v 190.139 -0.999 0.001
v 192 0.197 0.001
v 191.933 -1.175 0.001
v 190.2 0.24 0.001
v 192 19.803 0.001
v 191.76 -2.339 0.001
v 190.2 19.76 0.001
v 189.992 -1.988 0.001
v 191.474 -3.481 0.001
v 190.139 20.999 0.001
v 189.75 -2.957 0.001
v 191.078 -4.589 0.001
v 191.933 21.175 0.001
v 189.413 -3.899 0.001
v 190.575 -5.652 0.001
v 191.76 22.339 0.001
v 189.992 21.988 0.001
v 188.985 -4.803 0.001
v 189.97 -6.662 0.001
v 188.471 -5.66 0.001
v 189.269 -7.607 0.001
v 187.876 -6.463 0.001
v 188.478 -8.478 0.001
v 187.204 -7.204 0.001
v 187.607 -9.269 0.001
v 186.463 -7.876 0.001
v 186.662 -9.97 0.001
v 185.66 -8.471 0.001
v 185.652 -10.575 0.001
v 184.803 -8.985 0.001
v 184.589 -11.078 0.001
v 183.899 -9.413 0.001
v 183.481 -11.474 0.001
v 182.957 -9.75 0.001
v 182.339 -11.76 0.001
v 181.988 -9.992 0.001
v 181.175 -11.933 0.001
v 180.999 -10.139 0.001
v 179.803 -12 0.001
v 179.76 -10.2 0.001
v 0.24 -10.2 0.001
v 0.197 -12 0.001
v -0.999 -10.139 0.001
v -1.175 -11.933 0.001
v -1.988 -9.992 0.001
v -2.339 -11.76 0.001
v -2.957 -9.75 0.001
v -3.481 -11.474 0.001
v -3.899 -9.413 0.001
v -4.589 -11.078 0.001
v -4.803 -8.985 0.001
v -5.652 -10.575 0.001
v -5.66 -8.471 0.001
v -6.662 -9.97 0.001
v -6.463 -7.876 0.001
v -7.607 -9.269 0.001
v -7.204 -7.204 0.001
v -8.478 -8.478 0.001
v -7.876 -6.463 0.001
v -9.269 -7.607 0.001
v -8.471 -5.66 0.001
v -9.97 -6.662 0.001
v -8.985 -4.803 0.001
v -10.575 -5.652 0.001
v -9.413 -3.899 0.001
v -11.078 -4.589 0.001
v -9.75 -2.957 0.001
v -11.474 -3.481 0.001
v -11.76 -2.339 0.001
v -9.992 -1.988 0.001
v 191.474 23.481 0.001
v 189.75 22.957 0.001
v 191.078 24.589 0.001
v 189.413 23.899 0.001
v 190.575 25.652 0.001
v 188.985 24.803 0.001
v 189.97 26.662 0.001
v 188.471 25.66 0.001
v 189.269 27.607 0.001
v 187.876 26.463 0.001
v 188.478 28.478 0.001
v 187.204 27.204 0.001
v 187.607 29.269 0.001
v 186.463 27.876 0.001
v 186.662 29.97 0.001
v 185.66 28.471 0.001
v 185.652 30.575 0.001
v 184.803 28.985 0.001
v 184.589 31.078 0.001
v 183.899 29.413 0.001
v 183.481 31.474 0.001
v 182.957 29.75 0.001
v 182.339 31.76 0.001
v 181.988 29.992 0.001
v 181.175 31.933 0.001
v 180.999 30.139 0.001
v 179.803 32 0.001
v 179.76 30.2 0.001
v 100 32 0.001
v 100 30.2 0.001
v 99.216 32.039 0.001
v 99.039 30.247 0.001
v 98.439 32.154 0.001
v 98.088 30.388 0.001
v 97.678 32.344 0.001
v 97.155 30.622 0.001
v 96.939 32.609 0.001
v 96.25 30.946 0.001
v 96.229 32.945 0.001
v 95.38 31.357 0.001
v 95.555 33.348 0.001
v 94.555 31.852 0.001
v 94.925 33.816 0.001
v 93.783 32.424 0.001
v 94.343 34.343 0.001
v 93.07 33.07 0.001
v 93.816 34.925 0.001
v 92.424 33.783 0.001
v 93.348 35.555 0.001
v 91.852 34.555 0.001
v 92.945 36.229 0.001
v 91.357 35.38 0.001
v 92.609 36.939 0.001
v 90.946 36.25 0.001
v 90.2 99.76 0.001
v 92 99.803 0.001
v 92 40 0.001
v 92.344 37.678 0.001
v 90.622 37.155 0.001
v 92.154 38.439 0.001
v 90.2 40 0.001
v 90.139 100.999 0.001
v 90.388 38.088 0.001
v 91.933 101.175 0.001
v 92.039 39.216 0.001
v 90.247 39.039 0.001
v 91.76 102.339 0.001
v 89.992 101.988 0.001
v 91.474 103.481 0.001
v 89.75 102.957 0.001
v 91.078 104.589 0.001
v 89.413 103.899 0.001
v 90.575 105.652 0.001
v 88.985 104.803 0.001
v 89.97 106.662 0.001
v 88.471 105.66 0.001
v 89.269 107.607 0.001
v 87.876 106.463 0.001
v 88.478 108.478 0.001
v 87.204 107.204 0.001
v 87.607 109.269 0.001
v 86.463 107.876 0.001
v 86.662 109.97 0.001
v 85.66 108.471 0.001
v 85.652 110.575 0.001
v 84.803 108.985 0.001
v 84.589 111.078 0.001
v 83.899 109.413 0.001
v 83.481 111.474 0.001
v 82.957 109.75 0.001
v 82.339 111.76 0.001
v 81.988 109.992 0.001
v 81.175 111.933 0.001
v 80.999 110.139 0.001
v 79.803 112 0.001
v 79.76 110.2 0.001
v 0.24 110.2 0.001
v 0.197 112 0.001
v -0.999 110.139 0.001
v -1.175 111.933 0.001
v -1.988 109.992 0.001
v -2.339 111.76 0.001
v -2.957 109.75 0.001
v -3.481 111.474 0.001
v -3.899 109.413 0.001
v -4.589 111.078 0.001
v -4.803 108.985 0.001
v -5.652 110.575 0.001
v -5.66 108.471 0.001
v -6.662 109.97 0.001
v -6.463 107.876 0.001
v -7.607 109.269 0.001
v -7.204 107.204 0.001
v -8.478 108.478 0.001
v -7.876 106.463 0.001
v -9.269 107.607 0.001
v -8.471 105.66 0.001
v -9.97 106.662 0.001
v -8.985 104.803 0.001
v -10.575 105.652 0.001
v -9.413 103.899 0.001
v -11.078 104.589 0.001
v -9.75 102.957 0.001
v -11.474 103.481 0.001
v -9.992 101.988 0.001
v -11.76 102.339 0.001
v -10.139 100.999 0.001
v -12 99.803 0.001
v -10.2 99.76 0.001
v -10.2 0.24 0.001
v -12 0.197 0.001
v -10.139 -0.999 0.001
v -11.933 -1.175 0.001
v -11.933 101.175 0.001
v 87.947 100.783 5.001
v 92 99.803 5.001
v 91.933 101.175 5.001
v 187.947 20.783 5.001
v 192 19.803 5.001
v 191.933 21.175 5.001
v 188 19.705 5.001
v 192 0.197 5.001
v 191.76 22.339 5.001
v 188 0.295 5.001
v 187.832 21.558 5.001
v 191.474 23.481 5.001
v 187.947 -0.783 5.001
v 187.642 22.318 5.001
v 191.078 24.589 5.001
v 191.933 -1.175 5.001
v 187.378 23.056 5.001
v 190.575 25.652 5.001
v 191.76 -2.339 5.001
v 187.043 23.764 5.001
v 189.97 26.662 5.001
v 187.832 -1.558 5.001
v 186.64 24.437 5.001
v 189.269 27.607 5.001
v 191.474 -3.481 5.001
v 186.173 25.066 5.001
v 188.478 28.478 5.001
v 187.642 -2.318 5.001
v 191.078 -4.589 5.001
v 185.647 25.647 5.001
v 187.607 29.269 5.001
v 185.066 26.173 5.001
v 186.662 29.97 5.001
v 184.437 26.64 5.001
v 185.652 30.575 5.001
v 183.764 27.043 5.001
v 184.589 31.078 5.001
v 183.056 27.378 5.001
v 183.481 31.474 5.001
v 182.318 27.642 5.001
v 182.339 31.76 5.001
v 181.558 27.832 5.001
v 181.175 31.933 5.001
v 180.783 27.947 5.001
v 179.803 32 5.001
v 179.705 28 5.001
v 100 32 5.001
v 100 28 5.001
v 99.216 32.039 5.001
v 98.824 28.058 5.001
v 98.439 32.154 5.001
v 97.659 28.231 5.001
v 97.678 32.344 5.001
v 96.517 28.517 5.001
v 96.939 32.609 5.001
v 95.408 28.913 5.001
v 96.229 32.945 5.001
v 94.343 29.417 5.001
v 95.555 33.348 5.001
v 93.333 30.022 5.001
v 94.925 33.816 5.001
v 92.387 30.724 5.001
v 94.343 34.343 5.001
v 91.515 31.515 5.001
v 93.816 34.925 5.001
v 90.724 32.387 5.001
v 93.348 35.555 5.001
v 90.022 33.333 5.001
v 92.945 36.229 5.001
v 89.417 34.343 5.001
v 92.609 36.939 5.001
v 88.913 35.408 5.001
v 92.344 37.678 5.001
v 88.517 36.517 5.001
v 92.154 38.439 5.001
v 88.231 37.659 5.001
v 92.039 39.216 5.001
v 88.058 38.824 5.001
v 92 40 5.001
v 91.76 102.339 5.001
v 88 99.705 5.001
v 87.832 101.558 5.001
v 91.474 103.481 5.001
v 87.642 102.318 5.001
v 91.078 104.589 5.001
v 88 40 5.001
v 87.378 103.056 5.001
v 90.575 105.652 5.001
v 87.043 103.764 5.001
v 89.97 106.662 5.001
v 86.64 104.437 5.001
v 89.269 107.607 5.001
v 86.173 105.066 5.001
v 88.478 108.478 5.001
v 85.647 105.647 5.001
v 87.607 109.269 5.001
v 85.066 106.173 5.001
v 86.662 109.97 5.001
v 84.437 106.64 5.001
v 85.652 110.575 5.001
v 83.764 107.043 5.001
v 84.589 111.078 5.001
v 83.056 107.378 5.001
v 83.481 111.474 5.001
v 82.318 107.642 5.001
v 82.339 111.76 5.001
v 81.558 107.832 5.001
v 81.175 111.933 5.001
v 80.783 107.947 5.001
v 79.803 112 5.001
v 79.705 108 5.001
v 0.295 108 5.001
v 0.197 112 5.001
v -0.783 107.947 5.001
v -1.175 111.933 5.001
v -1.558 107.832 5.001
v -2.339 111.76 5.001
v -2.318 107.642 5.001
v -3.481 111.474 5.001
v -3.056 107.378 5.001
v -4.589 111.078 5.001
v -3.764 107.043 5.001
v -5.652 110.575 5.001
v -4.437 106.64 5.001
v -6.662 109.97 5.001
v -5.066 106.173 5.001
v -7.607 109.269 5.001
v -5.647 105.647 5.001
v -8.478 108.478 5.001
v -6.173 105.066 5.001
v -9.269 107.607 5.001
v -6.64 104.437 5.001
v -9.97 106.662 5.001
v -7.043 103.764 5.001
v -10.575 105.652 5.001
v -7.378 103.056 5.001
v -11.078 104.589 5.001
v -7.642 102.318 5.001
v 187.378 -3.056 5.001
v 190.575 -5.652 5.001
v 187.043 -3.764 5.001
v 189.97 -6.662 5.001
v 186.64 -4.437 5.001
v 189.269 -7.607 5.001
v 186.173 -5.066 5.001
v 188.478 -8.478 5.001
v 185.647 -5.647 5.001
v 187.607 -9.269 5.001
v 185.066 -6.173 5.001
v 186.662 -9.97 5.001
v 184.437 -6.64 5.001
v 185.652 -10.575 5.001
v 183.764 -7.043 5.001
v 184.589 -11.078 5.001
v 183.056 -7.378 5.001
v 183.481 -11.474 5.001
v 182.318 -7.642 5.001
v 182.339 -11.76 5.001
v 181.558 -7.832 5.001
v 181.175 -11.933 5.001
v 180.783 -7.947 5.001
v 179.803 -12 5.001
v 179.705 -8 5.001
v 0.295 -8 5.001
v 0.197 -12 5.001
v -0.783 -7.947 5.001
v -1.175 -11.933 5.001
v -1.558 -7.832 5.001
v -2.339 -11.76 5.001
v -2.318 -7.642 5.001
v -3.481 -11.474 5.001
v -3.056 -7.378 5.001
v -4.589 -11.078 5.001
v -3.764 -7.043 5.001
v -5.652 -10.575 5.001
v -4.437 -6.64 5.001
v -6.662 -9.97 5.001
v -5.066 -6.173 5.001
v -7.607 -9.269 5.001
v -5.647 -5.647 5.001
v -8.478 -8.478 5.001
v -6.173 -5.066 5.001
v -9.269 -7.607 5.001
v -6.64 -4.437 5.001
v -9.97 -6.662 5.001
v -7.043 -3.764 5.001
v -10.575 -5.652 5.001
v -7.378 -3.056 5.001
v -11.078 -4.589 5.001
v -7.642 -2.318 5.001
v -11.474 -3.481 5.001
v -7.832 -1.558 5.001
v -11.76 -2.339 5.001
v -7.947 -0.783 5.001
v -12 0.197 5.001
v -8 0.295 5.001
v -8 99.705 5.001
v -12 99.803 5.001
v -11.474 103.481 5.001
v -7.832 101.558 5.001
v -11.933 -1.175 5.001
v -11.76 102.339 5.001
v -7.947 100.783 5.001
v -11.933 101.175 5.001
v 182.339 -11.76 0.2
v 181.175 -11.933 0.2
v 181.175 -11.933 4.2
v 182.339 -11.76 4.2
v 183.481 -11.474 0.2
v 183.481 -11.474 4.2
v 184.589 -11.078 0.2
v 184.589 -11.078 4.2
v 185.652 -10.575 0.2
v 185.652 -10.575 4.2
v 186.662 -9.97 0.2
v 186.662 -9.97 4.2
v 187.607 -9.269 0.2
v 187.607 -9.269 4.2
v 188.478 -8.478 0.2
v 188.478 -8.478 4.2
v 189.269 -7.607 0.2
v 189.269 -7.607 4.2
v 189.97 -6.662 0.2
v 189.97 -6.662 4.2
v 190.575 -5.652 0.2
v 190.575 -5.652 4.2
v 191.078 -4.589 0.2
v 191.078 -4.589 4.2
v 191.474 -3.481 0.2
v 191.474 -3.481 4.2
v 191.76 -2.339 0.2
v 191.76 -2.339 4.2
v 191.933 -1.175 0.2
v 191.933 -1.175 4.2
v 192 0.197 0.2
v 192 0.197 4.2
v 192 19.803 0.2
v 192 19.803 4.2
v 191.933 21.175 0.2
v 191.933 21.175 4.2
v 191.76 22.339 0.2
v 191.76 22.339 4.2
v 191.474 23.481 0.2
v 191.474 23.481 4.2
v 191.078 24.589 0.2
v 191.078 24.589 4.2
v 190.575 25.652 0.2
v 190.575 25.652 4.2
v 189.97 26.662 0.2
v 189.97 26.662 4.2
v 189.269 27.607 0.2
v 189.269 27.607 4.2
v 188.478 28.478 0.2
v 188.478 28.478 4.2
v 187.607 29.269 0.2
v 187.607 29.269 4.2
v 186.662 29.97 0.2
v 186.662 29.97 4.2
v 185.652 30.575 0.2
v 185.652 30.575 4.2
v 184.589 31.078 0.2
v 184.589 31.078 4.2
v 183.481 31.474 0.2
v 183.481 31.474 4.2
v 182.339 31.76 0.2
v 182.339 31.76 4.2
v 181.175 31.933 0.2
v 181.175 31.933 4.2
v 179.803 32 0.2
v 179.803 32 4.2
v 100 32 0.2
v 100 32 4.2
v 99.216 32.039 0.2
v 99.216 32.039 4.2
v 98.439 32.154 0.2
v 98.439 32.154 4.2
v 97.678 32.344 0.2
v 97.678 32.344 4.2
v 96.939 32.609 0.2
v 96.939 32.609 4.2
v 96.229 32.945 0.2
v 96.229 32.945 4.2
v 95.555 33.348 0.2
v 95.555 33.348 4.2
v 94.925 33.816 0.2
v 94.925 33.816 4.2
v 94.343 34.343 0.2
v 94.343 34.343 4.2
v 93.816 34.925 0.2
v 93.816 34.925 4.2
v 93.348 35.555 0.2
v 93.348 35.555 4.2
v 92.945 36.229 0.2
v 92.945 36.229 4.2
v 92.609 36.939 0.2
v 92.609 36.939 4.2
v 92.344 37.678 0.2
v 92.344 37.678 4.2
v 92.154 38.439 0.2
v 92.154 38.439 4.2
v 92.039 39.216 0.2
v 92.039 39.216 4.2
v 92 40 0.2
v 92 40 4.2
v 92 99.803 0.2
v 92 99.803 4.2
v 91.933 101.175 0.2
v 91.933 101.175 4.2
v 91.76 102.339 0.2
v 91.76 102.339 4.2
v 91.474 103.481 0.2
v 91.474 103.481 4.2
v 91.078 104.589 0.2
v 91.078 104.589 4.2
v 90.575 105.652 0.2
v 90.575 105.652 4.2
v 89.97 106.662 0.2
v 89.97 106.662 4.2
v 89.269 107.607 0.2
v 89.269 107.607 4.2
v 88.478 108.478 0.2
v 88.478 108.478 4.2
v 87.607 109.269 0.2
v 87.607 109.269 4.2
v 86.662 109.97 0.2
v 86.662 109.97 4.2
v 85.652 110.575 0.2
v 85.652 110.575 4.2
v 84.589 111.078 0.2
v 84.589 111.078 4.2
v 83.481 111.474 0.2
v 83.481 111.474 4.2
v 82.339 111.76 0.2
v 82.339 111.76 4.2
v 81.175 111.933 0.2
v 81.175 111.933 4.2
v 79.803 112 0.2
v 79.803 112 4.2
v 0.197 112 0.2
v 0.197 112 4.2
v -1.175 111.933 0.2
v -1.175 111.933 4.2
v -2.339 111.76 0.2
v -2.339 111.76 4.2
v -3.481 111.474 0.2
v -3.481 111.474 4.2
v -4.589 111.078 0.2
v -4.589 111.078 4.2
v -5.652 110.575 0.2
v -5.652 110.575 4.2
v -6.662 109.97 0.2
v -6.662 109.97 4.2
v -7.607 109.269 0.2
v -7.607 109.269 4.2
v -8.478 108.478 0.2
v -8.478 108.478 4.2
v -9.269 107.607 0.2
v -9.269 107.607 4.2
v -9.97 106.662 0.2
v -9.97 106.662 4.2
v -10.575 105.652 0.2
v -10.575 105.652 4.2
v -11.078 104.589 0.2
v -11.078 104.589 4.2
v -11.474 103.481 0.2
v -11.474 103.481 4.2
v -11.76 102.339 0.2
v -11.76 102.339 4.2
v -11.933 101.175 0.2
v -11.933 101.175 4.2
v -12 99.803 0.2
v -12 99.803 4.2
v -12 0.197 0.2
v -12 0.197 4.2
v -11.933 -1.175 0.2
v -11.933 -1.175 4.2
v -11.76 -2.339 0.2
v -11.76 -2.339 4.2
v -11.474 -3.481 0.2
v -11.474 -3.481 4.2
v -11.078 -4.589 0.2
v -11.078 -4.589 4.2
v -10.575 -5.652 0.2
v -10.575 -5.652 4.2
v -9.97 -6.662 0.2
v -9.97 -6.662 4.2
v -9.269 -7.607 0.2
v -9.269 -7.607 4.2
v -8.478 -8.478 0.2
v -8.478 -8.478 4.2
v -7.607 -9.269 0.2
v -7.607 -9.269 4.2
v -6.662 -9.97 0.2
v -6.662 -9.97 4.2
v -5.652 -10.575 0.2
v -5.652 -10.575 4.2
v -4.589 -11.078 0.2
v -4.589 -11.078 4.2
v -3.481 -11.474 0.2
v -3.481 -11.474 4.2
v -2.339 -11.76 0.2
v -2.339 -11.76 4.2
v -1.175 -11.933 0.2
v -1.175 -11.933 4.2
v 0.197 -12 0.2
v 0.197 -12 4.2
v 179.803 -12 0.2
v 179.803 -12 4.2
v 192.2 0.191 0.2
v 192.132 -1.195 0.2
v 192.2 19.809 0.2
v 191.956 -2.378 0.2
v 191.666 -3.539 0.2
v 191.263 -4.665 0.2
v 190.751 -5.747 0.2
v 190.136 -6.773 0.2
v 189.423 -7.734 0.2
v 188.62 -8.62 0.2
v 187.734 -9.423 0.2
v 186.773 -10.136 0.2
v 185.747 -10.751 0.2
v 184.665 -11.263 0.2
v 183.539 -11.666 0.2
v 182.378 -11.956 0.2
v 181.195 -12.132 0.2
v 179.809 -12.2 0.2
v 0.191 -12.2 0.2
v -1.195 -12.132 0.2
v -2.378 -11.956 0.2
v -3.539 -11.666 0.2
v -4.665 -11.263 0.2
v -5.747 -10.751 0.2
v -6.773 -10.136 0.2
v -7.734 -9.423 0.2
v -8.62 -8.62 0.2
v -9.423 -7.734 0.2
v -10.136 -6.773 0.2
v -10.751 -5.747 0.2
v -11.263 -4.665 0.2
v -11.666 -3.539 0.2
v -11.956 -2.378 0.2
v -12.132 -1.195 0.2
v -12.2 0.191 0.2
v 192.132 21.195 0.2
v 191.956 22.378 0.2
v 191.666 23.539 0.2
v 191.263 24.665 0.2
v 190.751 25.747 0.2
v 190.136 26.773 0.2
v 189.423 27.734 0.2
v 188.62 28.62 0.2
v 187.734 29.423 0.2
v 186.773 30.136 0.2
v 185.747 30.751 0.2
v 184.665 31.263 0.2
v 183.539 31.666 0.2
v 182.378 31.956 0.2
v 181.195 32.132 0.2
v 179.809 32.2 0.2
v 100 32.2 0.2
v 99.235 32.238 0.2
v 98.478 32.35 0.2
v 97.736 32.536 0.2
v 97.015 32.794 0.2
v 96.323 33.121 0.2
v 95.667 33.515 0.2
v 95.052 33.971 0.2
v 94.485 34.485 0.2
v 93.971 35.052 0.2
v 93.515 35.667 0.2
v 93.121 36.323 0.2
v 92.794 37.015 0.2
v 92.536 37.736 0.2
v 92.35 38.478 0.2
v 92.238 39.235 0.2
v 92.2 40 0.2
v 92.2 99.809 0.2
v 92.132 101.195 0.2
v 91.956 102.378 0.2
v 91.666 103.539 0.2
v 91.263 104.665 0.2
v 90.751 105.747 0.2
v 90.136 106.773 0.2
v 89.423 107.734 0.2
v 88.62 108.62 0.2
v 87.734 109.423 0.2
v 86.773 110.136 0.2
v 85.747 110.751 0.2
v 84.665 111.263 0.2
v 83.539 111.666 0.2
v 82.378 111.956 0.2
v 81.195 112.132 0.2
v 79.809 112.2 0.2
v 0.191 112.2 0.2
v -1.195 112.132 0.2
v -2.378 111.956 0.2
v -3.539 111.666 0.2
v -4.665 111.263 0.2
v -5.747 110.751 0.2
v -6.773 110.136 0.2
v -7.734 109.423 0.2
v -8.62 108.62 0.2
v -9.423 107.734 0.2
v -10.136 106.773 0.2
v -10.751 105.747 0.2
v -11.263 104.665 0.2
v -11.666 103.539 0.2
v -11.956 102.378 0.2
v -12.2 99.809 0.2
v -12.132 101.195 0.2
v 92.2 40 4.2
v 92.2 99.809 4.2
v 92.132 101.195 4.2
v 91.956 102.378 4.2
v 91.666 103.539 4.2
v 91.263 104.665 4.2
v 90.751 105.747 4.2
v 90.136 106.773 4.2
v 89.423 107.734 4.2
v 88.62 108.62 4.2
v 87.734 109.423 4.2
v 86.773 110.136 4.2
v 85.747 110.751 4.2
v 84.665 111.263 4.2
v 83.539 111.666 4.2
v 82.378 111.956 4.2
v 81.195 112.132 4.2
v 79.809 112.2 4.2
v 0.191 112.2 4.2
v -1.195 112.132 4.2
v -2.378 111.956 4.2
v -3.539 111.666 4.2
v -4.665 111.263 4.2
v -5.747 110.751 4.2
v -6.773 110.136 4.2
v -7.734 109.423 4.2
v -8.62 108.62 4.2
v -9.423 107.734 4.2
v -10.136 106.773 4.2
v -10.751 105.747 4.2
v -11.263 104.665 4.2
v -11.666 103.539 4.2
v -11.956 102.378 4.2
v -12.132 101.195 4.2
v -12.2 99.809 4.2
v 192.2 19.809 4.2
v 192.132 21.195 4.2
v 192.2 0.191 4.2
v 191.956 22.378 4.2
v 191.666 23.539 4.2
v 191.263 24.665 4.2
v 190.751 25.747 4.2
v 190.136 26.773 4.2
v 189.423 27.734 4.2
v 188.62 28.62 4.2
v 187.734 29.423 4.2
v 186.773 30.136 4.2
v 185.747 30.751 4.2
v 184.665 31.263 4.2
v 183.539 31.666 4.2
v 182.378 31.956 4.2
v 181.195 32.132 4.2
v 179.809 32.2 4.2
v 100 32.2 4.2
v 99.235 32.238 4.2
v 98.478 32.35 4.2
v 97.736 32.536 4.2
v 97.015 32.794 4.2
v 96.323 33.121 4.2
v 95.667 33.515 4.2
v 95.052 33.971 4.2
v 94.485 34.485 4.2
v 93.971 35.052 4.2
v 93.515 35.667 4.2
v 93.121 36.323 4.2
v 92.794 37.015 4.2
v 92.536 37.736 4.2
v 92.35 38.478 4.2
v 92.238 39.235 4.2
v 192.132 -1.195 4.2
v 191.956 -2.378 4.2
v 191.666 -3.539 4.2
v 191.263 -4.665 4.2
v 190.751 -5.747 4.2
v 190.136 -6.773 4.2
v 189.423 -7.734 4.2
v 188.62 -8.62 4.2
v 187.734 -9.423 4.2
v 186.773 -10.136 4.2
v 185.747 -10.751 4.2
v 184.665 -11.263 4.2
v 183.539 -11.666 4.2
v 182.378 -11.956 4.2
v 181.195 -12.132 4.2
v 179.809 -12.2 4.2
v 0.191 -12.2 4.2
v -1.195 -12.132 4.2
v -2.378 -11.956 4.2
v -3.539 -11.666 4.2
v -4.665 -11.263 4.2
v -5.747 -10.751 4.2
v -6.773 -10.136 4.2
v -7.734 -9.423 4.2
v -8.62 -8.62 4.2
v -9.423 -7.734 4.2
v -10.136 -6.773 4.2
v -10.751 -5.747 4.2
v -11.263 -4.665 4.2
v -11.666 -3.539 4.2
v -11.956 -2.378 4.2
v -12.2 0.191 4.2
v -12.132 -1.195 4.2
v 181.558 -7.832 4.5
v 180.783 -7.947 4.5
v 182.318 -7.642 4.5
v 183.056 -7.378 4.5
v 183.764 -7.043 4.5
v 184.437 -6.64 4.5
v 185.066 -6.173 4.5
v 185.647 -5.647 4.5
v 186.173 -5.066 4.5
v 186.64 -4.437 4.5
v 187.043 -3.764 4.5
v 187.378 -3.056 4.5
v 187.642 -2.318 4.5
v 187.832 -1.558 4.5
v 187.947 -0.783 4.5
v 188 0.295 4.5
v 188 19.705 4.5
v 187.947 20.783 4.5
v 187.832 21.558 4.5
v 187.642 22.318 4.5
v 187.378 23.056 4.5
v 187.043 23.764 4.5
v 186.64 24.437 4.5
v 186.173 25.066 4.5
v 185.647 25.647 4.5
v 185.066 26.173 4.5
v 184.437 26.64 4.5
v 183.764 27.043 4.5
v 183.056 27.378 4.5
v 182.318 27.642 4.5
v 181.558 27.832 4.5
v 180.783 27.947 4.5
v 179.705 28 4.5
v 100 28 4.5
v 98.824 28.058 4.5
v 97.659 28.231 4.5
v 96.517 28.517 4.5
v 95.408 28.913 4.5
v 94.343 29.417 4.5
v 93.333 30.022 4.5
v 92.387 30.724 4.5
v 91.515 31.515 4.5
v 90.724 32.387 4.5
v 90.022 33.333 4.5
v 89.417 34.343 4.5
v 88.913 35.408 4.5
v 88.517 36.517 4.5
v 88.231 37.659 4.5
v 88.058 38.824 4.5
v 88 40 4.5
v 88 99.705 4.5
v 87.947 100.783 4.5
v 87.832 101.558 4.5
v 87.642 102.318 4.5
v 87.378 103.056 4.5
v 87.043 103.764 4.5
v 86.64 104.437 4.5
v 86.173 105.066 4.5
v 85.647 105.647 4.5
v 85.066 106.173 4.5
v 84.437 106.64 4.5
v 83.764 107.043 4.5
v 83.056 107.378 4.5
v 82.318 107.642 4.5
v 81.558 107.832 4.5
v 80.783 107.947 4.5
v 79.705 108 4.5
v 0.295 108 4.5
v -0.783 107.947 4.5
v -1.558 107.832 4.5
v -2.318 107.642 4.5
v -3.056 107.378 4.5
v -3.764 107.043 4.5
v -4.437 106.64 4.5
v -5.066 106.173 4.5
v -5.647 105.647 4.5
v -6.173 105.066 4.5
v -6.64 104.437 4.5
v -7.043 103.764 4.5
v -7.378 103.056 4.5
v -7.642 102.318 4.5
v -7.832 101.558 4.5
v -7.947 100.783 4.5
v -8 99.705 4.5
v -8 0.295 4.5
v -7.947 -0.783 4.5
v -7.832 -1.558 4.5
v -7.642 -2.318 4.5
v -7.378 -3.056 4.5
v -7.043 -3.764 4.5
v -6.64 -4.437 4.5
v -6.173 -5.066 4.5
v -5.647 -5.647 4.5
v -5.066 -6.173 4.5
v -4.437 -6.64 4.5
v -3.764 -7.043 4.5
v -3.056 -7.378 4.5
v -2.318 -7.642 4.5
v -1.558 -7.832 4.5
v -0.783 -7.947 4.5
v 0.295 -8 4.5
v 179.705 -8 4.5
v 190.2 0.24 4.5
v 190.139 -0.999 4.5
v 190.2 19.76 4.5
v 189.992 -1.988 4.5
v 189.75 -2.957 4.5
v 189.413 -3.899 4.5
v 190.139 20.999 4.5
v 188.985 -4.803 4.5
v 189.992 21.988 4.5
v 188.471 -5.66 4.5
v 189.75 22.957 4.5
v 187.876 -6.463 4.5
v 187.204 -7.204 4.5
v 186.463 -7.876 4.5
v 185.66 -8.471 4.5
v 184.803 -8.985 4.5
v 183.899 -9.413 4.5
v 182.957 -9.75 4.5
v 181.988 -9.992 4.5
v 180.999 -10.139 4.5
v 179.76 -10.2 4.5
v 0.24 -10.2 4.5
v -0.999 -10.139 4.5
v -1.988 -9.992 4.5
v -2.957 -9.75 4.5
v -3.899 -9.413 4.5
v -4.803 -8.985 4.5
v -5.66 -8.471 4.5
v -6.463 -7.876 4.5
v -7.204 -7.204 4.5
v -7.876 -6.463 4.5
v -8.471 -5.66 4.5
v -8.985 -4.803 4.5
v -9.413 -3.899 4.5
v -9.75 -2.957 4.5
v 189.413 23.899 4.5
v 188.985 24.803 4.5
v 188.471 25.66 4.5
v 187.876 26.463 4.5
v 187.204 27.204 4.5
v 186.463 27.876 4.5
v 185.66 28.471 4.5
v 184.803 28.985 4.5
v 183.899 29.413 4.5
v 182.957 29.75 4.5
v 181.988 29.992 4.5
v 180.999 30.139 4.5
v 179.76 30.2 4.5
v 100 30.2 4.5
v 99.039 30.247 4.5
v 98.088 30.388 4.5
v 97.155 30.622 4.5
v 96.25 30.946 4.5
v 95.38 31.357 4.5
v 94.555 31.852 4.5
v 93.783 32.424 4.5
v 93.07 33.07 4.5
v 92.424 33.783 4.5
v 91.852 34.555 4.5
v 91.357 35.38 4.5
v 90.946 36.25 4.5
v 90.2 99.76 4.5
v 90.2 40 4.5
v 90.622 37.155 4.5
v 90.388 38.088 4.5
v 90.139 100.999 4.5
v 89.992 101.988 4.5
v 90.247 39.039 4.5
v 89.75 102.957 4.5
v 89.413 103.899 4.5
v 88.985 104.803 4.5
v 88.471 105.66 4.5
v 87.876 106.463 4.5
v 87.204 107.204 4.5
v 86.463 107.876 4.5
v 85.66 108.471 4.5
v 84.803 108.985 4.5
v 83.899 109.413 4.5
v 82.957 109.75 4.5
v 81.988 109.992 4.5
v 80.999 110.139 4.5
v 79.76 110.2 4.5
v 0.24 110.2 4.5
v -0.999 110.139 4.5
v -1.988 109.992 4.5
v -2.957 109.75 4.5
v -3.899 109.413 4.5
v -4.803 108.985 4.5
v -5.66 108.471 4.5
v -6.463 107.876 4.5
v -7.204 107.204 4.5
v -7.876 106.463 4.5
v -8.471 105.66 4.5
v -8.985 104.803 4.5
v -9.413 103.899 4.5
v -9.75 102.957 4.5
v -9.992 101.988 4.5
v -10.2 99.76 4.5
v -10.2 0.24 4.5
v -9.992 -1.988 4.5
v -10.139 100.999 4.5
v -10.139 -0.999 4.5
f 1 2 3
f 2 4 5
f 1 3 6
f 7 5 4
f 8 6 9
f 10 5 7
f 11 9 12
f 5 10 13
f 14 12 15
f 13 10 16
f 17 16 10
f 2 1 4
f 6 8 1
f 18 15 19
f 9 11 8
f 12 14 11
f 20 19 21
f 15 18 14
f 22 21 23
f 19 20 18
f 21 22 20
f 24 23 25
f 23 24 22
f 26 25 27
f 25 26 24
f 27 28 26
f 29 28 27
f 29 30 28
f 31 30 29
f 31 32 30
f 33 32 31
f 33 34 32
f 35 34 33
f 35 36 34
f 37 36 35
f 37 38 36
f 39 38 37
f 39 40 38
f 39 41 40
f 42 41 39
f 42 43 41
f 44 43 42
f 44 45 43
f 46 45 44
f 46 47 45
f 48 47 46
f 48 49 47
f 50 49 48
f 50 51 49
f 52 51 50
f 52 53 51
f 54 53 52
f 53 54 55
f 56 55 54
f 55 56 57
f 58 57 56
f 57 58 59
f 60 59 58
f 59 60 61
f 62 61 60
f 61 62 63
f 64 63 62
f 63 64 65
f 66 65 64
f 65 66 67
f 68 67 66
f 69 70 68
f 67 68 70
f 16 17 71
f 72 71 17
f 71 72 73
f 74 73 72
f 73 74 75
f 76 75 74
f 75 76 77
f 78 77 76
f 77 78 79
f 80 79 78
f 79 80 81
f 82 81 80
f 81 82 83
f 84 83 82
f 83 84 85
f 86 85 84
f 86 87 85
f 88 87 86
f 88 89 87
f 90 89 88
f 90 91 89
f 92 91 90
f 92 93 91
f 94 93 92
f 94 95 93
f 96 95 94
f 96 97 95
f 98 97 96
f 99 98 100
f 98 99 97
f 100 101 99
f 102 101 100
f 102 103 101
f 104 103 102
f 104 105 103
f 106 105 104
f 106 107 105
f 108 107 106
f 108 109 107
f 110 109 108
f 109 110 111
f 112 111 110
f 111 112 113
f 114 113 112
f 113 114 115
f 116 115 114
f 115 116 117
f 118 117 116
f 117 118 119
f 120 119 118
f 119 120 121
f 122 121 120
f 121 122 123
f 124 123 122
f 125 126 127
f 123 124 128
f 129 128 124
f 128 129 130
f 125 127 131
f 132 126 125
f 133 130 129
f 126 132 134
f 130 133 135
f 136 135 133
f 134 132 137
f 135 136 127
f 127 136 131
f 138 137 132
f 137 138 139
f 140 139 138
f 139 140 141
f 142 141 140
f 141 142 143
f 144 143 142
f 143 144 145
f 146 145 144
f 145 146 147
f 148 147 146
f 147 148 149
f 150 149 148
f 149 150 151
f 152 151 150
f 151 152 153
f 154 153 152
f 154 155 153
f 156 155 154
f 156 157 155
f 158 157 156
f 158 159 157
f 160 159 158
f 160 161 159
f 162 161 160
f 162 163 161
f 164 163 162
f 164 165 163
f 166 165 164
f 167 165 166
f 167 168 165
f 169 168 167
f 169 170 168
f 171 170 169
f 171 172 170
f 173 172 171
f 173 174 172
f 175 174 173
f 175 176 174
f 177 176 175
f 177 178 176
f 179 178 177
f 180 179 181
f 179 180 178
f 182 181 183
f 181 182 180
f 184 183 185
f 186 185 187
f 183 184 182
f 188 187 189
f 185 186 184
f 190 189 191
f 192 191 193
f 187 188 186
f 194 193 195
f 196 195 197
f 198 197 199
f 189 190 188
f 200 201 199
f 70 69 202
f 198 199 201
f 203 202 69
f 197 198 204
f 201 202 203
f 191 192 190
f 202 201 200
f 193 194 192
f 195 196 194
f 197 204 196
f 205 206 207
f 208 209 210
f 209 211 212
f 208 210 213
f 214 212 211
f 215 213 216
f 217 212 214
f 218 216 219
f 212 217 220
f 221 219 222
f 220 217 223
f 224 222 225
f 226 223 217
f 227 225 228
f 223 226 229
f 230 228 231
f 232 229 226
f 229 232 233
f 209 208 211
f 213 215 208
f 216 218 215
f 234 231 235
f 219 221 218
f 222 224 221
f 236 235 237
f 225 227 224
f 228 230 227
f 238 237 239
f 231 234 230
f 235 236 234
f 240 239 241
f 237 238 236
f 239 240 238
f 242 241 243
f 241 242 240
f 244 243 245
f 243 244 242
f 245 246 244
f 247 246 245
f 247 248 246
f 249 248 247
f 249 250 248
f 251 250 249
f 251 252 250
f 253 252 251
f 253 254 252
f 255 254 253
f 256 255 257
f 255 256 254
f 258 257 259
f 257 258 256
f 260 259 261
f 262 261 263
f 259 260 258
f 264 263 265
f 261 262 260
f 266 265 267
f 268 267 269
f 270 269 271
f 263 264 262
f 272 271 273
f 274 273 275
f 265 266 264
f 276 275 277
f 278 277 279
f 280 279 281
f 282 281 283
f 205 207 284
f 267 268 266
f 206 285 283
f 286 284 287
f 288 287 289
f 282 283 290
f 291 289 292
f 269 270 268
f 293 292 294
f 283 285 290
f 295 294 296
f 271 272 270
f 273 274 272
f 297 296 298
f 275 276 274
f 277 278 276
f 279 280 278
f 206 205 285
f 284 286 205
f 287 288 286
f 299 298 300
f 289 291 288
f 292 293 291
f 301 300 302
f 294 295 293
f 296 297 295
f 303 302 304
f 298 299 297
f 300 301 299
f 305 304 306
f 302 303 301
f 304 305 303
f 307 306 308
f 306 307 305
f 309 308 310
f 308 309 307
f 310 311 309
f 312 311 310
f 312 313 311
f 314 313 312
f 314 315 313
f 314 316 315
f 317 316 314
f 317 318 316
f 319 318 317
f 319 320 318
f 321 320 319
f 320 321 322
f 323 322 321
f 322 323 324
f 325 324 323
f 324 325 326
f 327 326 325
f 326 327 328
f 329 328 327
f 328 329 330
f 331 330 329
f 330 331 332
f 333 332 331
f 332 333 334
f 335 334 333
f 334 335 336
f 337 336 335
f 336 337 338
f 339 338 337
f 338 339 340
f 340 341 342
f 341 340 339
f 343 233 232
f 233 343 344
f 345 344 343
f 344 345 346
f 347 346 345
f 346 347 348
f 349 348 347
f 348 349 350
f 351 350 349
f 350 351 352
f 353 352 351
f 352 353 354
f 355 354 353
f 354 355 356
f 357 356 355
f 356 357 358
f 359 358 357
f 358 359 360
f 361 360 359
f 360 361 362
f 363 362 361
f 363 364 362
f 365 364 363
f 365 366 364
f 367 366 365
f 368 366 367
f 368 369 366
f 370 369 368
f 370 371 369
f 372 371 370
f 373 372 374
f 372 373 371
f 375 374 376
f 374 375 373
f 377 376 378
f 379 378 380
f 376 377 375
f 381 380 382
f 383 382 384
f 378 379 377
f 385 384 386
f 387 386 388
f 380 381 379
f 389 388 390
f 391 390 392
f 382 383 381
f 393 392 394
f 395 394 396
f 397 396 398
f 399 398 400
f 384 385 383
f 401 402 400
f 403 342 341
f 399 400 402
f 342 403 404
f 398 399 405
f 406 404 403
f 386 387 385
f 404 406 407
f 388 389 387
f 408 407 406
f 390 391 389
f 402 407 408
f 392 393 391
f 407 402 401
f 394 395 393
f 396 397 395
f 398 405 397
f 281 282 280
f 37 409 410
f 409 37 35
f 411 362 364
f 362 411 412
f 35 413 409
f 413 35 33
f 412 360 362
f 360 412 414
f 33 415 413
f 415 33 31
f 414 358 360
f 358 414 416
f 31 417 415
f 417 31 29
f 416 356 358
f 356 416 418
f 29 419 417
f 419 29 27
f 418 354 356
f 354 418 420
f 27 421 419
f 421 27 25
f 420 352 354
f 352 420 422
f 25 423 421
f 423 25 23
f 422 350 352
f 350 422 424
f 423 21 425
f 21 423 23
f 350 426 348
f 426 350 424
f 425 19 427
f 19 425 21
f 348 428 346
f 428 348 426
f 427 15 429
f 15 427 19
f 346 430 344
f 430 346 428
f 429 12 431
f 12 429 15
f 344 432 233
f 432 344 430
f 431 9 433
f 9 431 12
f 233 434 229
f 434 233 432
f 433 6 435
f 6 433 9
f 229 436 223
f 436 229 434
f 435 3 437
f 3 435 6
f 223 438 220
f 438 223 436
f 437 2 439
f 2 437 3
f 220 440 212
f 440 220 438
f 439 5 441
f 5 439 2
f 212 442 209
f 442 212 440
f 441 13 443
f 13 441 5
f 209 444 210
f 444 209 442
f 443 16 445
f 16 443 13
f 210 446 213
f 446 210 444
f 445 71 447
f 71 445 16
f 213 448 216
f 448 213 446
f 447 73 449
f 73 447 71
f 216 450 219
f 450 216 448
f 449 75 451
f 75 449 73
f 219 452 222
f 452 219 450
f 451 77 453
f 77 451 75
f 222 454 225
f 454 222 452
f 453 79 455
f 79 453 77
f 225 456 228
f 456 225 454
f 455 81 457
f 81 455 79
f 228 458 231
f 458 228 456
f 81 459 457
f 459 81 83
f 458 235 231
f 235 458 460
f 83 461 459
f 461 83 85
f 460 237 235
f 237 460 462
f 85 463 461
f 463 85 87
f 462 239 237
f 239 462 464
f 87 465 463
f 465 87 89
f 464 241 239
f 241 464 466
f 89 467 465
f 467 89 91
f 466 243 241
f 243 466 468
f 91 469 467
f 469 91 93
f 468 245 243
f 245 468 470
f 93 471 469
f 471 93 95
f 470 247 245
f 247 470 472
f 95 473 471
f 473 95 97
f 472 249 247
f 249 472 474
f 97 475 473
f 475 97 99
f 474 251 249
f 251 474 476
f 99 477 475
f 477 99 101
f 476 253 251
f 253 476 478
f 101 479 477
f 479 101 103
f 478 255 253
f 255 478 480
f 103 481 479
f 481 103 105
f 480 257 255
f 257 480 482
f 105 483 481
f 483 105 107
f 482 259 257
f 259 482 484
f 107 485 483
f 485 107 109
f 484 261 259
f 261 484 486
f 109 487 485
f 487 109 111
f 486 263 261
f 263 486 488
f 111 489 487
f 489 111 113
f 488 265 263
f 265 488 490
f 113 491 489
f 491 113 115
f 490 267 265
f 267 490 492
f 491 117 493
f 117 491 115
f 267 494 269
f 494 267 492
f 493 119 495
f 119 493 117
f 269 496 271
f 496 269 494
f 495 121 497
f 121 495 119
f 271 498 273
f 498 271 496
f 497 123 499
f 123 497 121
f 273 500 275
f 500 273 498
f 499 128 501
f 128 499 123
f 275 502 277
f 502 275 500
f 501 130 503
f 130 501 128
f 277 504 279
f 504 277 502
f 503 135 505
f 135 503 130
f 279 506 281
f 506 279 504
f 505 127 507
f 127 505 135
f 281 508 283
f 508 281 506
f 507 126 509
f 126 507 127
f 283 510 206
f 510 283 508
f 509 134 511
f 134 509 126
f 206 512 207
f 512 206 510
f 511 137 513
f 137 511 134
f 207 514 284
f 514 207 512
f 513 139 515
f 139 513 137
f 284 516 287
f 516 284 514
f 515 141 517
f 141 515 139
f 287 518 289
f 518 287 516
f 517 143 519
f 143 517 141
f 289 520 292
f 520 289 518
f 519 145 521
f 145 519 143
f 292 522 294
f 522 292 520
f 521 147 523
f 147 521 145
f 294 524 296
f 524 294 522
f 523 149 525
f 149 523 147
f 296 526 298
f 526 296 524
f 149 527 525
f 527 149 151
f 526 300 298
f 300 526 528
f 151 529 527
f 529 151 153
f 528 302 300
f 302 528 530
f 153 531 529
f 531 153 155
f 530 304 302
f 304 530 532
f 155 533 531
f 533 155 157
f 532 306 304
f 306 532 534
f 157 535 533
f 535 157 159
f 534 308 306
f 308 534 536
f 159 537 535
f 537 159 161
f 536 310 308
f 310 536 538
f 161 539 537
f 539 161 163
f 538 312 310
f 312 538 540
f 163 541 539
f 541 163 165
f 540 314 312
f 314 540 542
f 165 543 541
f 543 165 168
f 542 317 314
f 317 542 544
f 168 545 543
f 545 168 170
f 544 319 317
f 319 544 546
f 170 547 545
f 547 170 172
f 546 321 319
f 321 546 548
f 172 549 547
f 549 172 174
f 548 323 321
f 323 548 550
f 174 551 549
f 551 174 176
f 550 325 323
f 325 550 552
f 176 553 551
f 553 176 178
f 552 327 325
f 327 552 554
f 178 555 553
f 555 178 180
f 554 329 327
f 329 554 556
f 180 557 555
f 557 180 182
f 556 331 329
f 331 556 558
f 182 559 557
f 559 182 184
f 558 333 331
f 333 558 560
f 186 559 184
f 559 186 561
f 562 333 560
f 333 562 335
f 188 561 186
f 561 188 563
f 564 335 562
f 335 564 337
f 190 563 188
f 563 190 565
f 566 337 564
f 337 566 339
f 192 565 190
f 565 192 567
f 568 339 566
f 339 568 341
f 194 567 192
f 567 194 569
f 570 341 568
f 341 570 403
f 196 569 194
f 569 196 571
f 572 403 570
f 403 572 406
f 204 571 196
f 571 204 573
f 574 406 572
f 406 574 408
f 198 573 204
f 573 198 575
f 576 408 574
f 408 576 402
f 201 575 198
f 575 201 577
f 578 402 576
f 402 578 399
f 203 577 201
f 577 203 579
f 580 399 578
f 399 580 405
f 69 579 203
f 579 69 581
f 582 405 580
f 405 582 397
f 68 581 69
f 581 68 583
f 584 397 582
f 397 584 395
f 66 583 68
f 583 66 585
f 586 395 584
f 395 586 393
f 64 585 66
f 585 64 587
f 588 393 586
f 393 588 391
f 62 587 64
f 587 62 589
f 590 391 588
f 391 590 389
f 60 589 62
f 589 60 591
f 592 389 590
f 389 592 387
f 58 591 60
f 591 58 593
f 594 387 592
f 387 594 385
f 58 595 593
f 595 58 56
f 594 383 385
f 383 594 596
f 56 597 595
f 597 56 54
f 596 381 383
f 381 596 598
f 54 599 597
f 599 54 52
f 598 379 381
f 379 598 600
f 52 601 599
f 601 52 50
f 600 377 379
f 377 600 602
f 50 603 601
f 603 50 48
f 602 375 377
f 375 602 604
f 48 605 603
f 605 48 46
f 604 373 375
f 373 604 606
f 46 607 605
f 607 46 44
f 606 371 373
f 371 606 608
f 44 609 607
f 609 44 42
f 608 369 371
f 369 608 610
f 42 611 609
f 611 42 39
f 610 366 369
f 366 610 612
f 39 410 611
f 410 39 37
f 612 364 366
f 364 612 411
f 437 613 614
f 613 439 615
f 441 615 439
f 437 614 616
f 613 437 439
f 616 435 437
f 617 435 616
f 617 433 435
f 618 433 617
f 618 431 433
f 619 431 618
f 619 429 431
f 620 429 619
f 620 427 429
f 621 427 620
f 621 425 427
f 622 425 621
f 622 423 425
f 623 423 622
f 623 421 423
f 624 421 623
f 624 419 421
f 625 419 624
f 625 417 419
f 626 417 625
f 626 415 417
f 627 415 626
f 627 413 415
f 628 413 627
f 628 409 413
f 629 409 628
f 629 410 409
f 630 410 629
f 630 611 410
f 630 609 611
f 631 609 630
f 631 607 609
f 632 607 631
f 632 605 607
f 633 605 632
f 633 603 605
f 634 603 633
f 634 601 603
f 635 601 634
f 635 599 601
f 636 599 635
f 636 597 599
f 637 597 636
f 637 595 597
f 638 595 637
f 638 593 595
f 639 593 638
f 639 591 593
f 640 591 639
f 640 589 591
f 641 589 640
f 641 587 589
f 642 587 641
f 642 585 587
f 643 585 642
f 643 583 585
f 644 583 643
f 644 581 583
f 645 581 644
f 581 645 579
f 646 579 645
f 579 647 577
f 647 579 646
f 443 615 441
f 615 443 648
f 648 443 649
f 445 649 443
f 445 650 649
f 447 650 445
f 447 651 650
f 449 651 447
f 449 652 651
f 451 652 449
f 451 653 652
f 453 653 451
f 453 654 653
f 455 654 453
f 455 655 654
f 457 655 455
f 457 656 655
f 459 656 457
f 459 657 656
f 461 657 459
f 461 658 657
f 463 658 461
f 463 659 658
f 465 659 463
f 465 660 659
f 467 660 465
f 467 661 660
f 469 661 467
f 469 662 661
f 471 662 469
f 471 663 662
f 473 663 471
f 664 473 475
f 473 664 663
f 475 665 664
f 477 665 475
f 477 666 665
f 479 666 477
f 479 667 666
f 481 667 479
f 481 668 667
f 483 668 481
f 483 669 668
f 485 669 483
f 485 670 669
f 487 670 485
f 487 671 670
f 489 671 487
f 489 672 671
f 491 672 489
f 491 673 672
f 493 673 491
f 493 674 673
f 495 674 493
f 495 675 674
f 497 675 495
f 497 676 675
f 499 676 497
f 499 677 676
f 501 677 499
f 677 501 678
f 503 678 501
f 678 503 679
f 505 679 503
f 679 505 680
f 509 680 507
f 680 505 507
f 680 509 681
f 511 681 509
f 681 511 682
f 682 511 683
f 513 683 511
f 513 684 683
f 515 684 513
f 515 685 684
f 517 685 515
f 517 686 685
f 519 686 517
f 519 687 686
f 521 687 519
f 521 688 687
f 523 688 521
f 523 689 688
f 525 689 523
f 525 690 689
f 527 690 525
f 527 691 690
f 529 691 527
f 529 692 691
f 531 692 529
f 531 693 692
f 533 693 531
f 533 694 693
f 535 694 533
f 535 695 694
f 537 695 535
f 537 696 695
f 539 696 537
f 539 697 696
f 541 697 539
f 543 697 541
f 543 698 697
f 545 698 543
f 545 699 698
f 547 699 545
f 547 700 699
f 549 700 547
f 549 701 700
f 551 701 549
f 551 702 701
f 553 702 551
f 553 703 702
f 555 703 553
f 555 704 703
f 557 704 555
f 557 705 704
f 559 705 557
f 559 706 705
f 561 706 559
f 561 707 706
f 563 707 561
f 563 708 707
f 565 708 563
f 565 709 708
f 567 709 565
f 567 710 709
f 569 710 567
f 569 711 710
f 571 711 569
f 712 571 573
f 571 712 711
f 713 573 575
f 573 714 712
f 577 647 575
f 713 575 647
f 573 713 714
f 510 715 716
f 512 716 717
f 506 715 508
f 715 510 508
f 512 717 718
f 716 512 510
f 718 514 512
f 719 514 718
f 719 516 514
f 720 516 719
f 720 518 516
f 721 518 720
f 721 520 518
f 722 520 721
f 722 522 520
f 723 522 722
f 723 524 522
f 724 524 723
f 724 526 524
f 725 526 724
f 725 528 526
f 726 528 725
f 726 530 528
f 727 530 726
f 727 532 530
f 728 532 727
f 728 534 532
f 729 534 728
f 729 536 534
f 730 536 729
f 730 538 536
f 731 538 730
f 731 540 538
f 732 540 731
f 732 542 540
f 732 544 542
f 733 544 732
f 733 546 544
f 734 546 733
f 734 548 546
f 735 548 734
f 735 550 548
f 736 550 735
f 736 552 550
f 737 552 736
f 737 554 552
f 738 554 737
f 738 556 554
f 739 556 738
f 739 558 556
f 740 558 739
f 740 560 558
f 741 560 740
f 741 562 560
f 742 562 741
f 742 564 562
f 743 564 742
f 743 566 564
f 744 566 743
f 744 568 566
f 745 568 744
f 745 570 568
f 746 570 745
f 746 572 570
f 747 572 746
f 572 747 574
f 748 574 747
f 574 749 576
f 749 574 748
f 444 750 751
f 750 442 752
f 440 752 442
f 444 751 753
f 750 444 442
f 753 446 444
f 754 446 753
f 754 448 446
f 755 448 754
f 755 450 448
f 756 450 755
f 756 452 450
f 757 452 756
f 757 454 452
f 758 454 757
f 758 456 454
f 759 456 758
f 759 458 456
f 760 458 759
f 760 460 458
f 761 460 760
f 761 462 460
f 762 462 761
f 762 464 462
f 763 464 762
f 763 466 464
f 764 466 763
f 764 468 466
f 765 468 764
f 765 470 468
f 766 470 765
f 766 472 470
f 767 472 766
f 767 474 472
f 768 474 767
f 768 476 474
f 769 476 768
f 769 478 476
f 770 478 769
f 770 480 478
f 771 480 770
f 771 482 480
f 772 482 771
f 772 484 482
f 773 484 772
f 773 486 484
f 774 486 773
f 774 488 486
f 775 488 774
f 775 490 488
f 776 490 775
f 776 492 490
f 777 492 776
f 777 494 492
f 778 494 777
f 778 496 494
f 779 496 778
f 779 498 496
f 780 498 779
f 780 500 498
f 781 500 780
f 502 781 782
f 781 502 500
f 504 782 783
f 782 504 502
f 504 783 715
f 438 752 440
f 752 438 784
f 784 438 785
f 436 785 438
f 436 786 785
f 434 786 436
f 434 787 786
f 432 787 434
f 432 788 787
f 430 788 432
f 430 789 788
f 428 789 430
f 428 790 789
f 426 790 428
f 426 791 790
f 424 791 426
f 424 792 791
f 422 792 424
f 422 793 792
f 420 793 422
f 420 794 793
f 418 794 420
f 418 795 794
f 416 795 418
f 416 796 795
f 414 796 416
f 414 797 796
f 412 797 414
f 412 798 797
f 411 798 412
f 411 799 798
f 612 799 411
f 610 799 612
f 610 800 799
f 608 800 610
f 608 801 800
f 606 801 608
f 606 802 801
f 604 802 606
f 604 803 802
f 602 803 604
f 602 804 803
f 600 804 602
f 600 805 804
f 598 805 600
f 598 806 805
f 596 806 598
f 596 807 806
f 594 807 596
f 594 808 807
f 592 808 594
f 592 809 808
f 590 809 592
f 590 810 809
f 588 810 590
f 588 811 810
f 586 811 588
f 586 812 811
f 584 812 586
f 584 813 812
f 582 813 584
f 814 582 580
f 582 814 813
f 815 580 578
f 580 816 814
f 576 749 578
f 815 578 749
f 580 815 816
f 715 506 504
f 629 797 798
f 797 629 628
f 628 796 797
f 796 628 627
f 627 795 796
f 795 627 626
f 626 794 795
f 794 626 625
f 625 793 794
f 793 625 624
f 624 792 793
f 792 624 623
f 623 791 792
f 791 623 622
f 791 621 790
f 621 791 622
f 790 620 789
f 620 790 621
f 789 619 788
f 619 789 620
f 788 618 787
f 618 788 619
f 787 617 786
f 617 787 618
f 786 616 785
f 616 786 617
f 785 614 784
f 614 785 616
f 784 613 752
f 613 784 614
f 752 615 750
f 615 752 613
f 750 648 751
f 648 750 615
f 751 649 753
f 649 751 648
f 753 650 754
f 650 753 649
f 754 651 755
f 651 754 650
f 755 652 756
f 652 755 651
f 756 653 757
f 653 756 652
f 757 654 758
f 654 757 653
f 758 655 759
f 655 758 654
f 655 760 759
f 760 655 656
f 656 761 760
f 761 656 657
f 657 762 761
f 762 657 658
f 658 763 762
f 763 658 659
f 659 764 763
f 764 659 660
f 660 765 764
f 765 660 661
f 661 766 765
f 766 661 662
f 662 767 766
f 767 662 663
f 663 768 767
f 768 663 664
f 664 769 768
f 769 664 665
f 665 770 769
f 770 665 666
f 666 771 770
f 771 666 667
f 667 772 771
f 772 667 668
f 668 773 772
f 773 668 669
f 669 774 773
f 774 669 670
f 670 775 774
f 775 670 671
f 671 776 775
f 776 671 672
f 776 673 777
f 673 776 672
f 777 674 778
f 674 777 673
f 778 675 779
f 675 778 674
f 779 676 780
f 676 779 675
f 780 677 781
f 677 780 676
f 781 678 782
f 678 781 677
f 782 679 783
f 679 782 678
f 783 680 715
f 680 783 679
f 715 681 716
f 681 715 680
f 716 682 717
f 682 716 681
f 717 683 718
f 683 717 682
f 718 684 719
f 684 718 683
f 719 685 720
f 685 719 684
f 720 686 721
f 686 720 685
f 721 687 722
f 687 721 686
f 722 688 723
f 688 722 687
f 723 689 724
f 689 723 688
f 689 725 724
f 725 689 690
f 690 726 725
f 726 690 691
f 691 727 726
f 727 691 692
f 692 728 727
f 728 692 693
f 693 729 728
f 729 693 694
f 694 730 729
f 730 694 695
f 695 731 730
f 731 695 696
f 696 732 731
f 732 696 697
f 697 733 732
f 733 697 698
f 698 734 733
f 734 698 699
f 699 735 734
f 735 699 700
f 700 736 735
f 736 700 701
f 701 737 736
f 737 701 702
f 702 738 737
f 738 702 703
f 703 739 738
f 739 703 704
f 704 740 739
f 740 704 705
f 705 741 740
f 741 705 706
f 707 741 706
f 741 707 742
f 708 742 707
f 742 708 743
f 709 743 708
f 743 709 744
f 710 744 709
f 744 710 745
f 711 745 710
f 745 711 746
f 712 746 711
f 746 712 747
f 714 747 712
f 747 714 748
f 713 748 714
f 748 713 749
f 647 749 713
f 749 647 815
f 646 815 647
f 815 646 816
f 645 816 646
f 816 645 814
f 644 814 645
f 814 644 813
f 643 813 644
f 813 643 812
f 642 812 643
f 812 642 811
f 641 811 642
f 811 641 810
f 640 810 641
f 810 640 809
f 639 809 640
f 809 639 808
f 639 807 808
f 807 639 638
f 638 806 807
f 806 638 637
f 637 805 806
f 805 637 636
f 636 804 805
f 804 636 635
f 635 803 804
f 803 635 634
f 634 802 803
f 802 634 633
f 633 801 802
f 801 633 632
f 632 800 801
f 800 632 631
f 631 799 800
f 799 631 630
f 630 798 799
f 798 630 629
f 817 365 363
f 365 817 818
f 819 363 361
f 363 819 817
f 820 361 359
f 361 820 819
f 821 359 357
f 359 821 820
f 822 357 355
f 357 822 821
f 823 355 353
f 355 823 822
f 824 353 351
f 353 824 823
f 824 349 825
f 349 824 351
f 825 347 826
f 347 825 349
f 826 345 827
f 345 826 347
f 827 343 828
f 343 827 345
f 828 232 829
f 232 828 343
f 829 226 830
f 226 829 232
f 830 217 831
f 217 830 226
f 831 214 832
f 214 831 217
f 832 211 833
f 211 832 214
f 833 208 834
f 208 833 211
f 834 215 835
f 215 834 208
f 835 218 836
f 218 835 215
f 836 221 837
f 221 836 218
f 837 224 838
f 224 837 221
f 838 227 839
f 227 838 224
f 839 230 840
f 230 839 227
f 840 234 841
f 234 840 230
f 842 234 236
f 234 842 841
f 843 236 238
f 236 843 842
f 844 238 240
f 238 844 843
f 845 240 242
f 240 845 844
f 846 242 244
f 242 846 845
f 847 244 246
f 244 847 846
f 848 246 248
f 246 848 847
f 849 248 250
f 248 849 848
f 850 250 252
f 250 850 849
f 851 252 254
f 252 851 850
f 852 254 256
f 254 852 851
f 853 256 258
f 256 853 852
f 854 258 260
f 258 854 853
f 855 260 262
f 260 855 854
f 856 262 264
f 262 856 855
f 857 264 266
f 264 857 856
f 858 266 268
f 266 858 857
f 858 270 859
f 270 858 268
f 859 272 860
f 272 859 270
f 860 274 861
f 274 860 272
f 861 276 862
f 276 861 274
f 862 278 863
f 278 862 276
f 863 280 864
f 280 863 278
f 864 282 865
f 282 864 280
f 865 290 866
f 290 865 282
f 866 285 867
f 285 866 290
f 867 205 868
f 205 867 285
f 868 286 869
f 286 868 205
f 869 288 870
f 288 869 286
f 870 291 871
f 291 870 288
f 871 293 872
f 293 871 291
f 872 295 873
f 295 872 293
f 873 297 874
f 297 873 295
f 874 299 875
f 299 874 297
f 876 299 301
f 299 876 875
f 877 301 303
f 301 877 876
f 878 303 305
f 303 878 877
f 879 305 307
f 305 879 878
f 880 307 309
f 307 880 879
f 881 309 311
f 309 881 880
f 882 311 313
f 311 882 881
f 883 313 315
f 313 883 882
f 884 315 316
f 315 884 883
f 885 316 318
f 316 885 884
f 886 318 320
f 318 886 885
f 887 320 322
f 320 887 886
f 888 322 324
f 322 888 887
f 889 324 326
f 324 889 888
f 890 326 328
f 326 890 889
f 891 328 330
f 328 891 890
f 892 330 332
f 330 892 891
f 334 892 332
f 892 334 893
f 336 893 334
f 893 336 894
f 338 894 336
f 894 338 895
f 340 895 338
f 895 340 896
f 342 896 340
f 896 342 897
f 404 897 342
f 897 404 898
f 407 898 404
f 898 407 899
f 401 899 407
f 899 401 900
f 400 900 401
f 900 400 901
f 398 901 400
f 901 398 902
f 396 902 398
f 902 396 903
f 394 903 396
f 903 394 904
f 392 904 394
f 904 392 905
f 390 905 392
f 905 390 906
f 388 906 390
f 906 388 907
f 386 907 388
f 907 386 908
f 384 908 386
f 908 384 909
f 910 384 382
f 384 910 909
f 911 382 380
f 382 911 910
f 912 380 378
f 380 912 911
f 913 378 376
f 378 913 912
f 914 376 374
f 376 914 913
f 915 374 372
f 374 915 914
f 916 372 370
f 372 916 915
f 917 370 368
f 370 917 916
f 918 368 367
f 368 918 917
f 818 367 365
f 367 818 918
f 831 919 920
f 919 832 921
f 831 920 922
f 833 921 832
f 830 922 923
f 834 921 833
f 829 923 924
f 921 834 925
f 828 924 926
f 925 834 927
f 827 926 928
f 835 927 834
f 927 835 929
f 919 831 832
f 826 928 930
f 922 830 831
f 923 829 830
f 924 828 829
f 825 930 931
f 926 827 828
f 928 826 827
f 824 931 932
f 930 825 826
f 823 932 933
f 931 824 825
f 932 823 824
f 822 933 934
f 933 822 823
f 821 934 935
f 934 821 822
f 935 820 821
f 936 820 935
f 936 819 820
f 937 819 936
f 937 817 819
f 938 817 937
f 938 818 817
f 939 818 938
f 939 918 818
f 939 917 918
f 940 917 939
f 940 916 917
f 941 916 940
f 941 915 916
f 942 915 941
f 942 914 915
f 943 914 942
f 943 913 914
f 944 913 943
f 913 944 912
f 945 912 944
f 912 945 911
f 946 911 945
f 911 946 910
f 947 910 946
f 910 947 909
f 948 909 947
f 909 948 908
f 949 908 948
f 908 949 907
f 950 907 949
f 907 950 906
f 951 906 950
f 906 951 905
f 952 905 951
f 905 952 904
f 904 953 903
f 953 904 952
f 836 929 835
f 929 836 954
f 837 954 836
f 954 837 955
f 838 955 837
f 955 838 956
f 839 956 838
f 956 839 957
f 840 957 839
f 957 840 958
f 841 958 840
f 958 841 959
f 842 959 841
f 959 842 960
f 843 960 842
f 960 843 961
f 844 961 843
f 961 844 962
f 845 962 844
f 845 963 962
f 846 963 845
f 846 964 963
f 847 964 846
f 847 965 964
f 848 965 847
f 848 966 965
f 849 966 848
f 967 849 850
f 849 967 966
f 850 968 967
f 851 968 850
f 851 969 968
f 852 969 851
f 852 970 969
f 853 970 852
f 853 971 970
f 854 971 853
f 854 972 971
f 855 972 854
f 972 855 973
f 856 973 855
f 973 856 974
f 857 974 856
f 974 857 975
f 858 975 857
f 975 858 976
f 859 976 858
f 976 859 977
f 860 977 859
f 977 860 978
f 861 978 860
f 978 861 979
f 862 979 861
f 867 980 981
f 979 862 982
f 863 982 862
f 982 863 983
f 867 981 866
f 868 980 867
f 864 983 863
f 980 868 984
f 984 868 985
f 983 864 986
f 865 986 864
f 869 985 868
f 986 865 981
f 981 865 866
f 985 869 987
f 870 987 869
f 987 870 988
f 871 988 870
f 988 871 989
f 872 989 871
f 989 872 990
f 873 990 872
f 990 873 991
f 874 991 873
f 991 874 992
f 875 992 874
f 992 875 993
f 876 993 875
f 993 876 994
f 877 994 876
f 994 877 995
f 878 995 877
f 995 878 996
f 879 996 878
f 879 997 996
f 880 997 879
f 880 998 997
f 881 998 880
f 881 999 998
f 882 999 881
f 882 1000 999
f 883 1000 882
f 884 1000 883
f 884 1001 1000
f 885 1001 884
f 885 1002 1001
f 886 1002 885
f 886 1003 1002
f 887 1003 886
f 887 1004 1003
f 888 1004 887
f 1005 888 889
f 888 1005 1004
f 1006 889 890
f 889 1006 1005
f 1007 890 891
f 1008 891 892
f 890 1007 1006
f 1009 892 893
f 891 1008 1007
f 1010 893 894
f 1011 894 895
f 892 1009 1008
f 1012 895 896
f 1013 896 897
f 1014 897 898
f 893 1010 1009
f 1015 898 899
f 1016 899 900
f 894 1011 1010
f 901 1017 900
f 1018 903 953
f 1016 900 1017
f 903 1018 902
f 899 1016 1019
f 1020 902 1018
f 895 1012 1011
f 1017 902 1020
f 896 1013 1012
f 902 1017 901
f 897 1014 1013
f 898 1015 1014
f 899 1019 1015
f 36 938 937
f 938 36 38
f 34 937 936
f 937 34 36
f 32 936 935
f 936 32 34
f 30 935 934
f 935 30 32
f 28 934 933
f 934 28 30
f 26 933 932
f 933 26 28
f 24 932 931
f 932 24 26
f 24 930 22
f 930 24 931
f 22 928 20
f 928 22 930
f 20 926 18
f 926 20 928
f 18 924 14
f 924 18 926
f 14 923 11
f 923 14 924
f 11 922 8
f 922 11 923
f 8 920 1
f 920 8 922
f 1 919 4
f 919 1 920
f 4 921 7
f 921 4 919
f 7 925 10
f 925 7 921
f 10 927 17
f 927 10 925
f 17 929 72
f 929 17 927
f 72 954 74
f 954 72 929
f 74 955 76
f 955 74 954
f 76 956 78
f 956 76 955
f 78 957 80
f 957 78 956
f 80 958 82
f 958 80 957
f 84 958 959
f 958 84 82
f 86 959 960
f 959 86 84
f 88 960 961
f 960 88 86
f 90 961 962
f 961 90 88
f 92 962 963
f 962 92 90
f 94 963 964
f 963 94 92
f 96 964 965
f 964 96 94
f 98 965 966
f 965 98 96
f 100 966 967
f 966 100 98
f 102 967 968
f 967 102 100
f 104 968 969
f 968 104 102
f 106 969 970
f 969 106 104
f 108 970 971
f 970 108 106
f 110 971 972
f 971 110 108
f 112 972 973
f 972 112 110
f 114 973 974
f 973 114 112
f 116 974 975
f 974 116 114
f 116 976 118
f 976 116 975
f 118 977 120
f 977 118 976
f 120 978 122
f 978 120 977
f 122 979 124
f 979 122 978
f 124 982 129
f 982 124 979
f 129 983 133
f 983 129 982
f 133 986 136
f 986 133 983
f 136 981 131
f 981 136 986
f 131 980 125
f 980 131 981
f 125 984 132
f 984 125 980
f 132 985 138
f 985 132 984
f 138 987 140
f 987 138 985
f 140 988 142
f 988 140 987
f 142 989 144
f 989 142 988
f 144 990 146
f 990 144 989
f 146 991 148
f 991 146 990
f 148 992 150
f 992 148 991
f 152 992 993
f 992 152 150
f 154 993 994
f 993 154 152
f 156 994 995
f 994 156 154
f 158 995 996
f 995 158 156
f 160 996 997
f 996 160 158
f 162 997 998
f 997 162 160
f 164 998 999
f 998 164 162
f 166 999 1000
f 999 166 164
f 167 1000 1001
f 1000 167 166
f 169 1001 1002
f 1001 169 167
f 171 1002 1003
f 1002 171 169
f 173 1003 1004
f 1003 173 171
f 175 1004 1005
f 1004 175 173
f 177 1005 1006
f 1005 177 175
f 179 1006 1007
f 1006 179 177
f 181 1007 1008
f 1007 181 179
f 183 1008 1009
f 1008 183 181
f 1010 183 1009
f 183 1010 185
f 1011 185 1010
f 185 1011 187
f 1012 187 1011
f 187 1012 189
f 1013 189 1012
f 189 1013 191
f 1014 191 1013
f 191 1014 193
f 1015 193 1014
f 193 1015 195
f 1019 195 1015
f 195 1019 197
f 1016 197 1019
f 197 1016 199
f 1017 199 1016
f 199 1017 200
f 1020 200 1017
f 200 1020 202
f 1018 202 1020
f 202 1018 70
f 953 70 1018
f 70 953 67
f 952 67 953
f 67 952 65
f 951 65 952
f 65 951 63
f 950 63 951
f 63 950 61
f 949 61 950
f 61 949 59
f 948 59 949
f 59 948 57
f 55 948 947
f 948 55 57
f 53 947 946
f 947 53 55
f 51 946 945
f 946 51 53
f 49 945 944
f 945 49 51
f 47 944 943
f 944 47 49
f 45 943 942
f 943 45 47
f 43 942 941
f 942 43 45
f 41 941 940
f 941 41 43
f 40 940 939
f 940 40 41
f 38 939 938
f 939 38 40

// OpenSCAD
$fn=64;
module names() {
    color("grey")
    linear_extrude(2)
    {
        h=24;
        off = 10
        ;
        indent = 0;
        translate([indent,3*h+off])
        text("Koen", size=20, font="Wilgenrijk");
        translate([indent,2*h+off])
        text("Wendy", size=20, font="Wilgenrijk");
        translate([indent,1*h+off])
        text("Marit", size=20, font="Wilgenrijk");
        translate([0,0])
        text("van Leeuwen", size=27, font="Wilgenrijk");
    }
    color("white")
    linear_extrude(1)
        offset(-10)
        offset(20)
        {
            difference()
            {
                square([180,100]);
                translate([80,20])
                    square( [180,100]);
            }
        }
}

module number() {

    color("darkgrey")
    linear_extrude(2)
        translate([130/2,15])
        text("17", size=100, font="Wilgenrijk", halign="center");
    color("teal")
        linear_extrude(1)
        difference() {
            offset(10)
                square([150-20,120-20]);
                
            circle(r=2);
            translate([130,0])
            circle(r=2);
            translate([0,100])
            circle(r=2);
            translate([130,100])
            circle(r=2);
        }

} 

module shape(offset, h) {

        linear_extrude(h, convexity=10)
    offset(-10+offset)
            offset(20)
            {
                difference()
                {
                    square([180,100]);
                    translate([80,20])
                        square( [180,100]);
                }
            }
        
}
   /* translate([100.2,40.2])
        number();*/
//    names();

    color("darkgrey")
    difference() {
            union(){
                translate([0,0,0.001])
                shape(2,h=5); 
                translate([0,0,0.2])                
                shape(2.2,h=4); 
            }
            shape(-2, h=10);         
            shape(0.2, h=4.5);
    }
